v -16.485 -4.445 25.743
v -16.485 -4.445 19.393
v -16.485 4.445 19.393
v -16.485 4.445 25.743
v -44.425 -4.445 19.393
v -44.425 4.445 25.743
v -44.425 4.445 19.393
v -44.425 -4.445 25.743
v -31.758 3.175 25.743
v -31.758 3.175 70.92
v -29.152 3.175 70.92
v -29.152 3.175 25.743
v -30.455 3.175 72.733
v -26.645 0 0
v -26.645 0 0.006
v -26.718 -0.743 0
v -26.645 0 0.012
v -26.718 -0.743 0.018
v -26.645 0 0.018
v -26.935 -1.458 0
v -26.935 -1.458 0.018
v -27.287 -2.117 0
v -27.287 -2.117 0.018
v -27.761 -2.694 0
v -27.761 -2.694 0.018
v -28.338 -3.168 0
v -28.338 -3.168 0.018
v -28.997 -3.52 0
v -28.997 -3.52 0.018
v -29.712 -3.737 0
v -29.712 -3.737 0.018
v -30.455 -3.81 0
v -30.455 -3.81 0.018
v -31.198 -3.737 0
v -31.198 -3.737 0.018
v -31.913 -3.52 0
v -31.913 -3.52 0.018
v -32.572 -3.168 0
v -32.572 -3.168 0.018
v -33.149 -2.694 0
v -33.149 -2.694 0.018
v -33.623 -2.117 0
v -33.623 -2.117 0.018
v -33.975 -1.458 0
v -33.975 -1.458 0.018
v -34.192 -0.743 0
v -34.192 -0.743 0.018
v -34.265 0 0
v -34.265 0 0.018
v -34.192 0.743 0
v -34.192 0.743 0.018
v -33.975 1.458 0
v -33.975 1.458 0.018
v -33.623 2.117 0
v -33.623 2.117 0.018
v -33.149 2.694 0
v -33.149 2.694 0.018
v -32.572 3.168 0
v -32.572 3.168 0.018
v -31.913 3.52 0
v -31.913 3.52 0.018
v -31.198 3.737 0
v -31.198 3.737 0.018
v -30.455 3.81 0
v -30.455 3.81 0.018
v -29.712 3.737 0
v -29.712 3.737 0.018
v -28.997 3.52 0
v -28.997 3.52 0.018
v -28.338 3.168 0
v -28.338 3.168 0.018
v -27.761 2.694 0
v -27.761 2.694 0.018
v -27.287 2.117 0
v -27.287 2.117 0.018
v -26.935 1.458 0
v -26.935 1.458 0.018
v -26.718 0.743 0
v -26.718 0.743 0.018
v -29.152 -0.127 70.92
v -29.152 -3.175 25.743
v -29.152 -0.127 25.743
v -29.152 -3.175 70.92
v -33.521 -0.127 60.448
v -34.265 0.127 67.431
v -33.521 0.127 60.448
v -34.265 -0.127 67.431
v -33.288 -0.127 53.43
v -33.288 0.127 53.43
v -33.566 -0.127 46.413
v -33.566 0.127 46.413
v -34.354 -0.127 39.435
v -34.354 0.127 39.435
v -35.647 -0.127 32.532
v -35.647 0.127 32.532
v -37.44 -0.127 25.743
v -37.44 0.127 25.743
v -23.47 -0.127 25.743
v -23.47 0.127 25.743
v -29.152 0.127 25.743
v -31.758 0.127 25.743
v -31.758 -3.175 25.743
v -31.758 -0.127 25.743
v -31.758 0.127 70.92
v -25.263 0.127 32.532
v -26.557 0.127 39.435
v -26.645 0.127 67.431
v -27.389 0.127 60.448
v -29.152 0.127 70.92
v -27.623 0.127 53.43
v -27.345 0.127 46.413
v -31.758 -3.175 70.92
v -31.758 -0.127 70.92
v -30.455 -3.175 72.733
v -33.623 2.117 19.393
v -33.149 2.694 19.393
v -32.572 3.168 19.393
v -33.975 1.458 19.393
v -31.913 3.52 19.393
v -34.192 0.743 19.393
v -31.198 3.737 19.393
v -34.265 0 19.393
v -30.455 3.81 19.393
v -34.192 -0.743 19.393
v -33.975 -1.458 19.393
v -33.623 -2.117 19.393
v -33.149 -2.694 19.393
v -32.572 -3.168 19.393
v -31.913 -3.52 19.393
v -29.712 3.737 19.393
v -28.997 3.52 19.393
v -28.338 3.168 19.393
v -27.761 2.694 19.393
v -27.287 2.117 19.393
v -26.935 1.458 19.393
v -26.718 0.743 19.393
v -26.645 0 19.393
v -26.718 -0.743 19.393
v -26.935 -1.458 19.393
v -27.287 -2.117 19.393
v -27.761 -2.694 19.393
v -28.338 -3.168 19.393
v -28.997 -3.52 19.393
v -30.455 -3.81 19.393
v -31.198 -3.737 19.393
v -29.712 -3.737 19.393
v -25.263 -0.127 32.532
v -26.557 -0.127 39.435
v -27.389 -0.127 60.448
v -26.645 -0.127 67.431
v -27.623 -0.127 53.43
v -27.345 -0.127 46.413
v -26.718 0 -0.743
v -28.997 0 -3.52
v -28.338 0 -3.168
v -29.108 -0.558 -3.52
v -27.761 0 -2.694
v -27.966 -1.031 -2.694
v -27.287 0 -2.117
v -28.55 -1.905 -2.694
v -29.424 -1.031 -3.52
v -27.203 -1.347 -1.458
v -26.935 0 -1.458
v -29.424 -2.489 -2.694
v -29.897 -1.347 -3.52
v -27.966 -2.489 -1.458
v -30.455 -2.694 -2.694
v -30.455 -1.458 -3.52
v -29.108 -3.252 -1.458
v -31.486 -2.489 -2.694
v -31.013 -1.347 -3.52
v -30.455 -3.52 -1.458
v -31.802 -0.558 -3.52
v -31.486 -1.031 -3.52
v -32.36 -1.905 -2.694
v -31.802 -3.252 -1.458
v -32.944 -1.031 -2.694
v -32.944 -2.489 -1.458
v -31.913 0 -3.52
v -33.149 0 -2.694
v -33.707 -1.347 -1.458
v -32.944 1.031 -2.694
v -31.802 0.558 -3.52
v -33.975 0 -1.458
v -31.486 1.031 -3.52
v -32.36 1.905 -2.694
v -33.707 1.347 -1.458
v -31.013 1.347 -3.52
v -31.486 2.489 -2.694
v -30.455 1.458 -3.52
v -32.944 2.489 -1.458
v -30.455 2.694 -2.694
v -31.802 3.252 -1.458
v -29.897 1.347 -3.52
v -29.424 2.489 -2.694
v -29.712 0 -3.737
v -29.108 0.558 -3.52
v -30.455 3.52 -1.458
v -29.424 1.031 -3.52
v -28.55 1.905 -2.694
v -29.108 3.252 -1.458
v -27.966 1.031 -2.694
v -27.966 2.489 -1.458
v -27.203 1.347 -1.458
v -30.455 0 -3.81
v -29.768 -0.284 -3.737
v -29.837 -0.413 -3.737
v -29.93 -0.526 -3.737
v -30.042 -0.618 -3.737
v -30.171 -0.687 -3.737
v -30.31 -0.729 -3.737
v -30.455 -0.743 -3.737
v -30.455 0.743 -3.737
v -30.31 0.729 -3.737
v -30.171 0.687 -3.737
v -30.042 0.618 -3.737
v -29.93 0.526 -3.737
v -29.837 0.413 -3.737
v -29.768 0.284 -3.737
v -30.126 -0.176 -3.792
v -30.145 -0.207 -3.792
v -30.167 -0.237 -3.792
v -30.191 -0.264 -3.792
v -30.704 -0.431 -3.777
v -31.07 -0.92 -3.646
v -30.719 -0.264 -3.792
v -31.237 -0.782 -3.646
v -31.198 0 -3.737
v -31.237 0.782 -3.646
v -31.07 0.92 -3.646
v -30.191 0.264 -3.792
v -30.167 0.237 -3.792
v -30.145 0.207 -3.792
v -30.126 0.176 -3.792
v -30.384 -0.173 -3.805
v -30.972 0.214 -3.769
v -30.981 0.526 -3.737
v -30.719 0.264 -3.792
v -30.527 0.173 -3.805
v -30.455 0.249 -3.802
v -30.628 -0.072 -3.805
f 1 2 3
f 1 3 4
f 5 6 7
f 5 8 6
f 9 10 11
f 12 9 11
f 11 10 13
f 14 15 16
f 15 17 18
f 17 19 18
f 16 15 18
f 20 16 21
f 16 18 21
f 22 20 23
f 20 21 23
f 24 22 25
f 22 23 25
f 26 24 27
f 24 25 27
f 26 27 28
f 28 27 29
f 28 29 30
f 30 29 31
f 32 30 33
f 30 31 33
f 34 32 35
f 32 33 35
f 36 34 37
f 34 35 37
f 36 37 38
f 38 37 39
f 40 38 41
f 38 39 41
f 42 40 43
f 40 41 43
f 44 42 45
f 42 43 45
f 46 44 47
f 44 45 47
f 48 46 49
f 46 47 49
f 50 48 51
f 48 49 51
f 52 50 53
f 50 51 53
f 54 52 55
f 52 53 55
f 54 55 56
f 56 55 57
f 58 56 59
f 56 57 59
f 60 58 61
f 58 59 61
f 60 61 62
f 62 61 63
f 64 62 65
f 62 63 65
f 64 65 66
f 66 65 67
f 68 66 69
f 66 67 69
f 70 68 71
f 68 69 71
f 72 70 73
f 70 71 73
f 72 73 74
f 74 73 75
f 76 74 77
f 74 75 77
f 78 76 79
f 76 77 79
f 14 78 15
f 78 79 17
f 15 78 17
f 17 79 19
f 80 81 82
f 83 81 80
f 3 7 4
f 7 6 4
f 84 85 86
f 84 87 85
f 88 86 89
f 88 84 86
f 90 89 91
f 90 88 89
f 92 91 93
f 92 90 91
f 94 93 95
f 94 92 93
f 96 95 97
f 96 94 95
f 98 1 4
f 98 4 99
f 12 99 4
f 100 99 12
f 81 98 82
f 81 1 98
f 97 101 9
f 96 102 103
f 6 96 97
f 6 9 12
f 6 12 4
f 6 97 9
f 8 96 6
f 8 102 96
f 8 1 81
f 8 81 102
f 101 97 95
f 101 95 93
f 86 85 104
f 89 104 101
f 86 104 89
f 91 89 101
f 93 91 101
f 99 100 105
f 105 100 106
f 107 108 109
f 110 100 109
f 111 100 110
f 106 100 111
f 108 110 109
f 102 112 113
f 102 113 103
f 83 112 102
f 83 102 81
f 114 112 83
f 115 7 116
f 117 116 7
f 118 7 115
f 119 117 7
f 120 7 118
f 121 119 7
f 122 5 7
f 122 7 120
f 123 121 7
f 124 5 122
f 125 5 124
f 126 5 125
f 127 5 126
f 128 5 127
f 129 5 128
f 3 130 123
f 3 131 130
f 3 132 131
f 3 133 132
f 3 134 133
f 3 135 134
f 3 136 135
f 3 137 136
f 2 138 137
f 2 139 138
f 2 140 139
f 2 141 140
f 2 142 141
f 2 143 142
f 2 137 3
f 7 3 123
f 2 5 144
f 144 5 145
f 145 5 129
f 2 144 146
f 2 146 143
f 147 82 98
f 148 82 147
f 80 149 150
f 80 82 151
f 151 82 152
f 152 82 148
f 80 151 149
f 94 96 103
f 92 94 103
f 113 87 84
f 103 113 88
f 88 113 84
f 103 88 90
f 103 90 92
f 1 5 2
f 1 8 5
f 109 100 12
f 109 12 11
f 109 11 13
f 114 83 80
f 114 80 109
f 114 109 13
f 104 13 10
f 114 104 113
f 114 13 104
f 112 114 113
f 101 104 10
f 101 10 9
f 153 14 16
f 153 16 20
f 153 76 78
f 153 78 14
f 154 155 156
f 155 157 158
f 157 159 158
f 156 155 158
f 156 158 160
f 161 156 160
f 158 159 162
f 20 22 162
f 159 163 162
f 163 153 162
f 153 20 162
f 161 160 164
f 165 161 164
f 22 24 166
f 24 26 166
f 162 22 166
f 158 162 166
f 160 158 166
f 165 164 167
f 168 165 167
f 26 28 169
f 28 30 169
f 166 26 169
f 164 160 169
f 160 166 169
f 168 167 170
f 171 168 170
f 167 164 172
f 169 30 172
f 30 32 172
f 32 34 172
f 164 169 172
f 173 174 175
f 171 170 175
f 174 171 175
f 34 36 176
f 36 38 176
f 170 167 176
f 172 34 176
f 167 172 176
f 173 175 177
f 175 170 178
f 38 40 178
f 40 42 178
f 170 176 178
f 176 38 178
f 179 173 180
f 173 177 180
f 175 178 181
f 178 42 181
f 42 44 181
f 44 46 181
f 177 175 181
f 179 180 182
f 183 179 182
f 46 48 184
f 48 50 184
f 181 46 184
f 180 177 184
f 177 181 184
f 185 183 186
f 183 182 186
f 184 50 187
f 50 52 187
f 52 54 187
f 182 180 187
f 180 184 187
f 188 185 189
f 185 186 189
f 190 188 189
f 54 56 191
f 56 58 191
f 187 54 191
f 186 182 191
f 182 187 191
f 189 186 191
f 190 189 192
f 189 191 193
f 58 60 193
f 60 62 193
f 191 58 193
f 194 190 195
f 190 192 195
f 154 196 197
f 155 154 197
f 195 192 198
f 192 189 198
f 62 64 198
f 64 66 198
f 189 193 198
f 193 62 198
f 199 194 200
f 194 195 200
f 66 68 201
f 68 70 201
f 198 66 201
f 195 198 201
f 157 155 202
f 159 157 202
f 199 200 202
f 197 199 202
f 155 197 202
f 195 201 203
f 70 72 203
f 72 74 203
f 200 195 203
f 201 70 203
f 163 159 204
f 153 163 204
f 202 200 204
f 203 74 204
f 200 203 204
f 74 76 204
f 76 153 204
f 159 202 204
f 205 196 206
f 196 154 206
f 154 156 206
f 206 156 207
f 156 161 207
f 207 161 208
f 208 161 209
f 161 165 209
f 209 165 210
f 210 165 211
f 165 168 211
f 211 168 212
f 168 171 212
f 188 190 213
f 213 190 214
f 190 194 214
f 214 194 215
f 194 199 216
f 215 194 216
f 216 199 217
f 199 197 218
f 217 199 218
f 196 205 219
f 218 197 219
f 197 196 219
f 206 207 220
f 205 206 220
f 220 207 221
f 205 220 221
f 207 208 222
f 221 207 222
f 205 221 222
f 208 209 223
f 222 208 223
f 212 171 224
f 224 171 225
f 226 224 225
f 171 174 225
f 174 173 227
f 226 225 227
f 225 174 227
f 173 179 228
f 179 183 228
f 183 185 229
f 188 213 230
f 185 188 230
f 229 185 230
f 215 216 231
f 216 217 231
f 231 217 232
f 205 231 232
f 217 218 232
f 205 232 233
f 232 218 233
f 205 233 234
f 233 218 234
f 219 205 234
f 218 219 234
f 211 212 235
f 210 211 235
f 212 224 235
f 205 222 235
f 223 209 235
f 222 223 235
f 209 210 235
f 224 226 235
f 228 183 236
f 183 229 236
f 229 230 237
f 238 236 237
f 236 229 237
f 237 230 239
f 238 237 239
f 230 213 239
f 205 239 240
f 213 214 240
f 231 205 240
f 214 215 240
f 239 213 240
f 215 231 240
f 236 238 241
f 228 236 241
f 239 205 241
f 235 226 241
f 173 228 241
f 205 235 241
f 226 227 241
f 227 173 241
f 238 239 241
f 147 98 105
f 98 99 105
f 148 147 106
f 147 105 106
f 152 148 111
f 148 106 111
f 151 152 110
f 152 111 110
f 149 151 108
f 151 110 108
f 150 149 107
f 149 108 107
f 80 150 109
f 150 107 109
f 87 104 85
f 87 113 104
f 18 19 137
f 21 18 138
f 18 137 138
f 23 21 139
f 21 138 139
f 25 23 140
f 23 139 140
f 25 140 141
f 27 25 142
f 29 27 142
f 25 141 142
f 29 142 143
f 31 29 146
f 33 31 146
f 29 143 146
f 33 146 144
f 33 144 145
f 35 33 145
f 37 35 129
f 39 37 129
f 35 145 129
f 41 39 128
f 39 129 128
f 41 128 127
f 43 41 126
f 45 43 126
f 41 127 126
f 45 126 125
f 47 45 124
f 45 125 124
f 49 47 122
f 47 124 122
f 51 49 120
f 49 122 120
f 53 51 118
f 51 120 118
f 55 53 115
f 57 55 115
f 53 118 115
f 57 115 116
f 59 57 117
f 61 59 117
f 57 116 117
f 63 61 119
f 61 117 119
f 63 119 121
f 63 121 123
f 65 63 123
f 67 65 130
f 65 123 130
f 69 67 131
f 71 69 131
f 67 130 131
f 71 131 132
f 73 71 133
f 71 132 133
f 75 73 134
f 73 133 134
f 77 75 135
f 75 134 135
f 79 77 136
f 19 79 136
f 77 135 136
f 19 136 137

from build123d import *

# Parameters (mm, degrees)
F2_DEPTH = 4.445
F3_DEPTH = 0.127
F4_DEPTH = 3.175


with BuildPart() as f1:
    # F0 (on Front) → F1 (revolve)
    with BuildSketch(Plane.XZ):
        with BuildLine():
            Line((-26.645181, 19.392501), (-30.455181, 19.392501))
            Line((-30.455181, 19.392501), (-30.455181, 3.810044))
            ThreePointArc((-30.455181, 3.810044), (-27.767587, 2.700607), (-26.645181, 0.018404))
            Line((-26.645181, 0.018404), (-26.645181, 19.392501))
        make_face()
        with BuildLine():
            Line((-26.645181, 0.018404), (-30.455181, 0.018404))
            Line((-30.455181, 0.018404), (-30.455181, -3.810044))
            ThreePointArc((-30.455181, -3.810044), (-27.761072, -2.694108), (-26.645136, 0))
            ThreePointArc((-26.645136, 0), (-26.645147, 0.009202), (-26.645181, 0.018404))
        make_face()
        with BuildLine():
            ThreePointArc((-26.645181, 0.018404), (-27.767587, 2.700607), (-30.455181, 3.810044))
            Line((-30.455181, 3.810044), (-30.455181, 0.018404))
            Line((-30.455181, 0.018404), (-26.645181, 0.018404))
        make_face()
    revolve(axis=Axis((-30.455181, 0, 9.705453), (0, 0, -1)))

    # F0 (on Front) → F2 (join, symmetric)
    with BuildSketch(Plane.XZ):
        Polygon((-44.425181, 19.392501), (-34.265181, 19.392501), (-30.455181, 19.392501), (-26.645181, 19.392501), (-16.485181, 19.392501), (-16.485181, 25.742501), (-23.470181, 25.742501), (-29.15215, 25.742501), (-30.455181, 25.742501), (-31.758212, 25.742501), (-37.440181, 25.742501), (-44.425181, 25.742501), align=None)
    extrude(amount=F2_DEPTH, both=True)

    # F0 (on Front) → F3 (join, symmetric)
    with BuildSketch(Plane.XZ):
        with BuildLine():
            Line((-29.15215, 25.742501), (-23.470181, 25.742501))
            ThreePointArc((-23.470181, 25.742501), (-27.34467, 46.412762), (-26.645181, 67.431375))
            Line((-26.645181, 67.431375), (-29.15215, 70.919501))
            Line((-29.15215, 70.919501), (-29.15215, 25.742501))
        make_face()
        with BuildLine():
            ThreePointArc((-34.265181, 67.431375), (-33.565691, 46.412762), (-37.440181, 25.742501))
            Line((-37.440181, 25.742501), (-31.758212, 25.742501))
            Line((-31.758212, 25.742501), (-31.758212, 70.919501))
            Line((-31.758212, 70.919501), (-34.265181, 67.431375))
        make_face()
    extrude(amount=F3_DEPTH, both=True)

    # F0 (on Front) → F4 (join, symmetric)
    with BuildSketch(Plane.XZ):
        Polygon((-30.455181, 72.732501), (-30.455181, 25.742501), (-29.15215, 25.742501), (-29.15215, 70.919501), align=None)
        Polygon((-31.758212, 70.919501), (-31.758212, 25.742501), (-30.455181, 25.742501), (-30.455181, 72.732501), align=None)
    extrude(amount=F4_DEPTH, both=True)


solid = f1.part
